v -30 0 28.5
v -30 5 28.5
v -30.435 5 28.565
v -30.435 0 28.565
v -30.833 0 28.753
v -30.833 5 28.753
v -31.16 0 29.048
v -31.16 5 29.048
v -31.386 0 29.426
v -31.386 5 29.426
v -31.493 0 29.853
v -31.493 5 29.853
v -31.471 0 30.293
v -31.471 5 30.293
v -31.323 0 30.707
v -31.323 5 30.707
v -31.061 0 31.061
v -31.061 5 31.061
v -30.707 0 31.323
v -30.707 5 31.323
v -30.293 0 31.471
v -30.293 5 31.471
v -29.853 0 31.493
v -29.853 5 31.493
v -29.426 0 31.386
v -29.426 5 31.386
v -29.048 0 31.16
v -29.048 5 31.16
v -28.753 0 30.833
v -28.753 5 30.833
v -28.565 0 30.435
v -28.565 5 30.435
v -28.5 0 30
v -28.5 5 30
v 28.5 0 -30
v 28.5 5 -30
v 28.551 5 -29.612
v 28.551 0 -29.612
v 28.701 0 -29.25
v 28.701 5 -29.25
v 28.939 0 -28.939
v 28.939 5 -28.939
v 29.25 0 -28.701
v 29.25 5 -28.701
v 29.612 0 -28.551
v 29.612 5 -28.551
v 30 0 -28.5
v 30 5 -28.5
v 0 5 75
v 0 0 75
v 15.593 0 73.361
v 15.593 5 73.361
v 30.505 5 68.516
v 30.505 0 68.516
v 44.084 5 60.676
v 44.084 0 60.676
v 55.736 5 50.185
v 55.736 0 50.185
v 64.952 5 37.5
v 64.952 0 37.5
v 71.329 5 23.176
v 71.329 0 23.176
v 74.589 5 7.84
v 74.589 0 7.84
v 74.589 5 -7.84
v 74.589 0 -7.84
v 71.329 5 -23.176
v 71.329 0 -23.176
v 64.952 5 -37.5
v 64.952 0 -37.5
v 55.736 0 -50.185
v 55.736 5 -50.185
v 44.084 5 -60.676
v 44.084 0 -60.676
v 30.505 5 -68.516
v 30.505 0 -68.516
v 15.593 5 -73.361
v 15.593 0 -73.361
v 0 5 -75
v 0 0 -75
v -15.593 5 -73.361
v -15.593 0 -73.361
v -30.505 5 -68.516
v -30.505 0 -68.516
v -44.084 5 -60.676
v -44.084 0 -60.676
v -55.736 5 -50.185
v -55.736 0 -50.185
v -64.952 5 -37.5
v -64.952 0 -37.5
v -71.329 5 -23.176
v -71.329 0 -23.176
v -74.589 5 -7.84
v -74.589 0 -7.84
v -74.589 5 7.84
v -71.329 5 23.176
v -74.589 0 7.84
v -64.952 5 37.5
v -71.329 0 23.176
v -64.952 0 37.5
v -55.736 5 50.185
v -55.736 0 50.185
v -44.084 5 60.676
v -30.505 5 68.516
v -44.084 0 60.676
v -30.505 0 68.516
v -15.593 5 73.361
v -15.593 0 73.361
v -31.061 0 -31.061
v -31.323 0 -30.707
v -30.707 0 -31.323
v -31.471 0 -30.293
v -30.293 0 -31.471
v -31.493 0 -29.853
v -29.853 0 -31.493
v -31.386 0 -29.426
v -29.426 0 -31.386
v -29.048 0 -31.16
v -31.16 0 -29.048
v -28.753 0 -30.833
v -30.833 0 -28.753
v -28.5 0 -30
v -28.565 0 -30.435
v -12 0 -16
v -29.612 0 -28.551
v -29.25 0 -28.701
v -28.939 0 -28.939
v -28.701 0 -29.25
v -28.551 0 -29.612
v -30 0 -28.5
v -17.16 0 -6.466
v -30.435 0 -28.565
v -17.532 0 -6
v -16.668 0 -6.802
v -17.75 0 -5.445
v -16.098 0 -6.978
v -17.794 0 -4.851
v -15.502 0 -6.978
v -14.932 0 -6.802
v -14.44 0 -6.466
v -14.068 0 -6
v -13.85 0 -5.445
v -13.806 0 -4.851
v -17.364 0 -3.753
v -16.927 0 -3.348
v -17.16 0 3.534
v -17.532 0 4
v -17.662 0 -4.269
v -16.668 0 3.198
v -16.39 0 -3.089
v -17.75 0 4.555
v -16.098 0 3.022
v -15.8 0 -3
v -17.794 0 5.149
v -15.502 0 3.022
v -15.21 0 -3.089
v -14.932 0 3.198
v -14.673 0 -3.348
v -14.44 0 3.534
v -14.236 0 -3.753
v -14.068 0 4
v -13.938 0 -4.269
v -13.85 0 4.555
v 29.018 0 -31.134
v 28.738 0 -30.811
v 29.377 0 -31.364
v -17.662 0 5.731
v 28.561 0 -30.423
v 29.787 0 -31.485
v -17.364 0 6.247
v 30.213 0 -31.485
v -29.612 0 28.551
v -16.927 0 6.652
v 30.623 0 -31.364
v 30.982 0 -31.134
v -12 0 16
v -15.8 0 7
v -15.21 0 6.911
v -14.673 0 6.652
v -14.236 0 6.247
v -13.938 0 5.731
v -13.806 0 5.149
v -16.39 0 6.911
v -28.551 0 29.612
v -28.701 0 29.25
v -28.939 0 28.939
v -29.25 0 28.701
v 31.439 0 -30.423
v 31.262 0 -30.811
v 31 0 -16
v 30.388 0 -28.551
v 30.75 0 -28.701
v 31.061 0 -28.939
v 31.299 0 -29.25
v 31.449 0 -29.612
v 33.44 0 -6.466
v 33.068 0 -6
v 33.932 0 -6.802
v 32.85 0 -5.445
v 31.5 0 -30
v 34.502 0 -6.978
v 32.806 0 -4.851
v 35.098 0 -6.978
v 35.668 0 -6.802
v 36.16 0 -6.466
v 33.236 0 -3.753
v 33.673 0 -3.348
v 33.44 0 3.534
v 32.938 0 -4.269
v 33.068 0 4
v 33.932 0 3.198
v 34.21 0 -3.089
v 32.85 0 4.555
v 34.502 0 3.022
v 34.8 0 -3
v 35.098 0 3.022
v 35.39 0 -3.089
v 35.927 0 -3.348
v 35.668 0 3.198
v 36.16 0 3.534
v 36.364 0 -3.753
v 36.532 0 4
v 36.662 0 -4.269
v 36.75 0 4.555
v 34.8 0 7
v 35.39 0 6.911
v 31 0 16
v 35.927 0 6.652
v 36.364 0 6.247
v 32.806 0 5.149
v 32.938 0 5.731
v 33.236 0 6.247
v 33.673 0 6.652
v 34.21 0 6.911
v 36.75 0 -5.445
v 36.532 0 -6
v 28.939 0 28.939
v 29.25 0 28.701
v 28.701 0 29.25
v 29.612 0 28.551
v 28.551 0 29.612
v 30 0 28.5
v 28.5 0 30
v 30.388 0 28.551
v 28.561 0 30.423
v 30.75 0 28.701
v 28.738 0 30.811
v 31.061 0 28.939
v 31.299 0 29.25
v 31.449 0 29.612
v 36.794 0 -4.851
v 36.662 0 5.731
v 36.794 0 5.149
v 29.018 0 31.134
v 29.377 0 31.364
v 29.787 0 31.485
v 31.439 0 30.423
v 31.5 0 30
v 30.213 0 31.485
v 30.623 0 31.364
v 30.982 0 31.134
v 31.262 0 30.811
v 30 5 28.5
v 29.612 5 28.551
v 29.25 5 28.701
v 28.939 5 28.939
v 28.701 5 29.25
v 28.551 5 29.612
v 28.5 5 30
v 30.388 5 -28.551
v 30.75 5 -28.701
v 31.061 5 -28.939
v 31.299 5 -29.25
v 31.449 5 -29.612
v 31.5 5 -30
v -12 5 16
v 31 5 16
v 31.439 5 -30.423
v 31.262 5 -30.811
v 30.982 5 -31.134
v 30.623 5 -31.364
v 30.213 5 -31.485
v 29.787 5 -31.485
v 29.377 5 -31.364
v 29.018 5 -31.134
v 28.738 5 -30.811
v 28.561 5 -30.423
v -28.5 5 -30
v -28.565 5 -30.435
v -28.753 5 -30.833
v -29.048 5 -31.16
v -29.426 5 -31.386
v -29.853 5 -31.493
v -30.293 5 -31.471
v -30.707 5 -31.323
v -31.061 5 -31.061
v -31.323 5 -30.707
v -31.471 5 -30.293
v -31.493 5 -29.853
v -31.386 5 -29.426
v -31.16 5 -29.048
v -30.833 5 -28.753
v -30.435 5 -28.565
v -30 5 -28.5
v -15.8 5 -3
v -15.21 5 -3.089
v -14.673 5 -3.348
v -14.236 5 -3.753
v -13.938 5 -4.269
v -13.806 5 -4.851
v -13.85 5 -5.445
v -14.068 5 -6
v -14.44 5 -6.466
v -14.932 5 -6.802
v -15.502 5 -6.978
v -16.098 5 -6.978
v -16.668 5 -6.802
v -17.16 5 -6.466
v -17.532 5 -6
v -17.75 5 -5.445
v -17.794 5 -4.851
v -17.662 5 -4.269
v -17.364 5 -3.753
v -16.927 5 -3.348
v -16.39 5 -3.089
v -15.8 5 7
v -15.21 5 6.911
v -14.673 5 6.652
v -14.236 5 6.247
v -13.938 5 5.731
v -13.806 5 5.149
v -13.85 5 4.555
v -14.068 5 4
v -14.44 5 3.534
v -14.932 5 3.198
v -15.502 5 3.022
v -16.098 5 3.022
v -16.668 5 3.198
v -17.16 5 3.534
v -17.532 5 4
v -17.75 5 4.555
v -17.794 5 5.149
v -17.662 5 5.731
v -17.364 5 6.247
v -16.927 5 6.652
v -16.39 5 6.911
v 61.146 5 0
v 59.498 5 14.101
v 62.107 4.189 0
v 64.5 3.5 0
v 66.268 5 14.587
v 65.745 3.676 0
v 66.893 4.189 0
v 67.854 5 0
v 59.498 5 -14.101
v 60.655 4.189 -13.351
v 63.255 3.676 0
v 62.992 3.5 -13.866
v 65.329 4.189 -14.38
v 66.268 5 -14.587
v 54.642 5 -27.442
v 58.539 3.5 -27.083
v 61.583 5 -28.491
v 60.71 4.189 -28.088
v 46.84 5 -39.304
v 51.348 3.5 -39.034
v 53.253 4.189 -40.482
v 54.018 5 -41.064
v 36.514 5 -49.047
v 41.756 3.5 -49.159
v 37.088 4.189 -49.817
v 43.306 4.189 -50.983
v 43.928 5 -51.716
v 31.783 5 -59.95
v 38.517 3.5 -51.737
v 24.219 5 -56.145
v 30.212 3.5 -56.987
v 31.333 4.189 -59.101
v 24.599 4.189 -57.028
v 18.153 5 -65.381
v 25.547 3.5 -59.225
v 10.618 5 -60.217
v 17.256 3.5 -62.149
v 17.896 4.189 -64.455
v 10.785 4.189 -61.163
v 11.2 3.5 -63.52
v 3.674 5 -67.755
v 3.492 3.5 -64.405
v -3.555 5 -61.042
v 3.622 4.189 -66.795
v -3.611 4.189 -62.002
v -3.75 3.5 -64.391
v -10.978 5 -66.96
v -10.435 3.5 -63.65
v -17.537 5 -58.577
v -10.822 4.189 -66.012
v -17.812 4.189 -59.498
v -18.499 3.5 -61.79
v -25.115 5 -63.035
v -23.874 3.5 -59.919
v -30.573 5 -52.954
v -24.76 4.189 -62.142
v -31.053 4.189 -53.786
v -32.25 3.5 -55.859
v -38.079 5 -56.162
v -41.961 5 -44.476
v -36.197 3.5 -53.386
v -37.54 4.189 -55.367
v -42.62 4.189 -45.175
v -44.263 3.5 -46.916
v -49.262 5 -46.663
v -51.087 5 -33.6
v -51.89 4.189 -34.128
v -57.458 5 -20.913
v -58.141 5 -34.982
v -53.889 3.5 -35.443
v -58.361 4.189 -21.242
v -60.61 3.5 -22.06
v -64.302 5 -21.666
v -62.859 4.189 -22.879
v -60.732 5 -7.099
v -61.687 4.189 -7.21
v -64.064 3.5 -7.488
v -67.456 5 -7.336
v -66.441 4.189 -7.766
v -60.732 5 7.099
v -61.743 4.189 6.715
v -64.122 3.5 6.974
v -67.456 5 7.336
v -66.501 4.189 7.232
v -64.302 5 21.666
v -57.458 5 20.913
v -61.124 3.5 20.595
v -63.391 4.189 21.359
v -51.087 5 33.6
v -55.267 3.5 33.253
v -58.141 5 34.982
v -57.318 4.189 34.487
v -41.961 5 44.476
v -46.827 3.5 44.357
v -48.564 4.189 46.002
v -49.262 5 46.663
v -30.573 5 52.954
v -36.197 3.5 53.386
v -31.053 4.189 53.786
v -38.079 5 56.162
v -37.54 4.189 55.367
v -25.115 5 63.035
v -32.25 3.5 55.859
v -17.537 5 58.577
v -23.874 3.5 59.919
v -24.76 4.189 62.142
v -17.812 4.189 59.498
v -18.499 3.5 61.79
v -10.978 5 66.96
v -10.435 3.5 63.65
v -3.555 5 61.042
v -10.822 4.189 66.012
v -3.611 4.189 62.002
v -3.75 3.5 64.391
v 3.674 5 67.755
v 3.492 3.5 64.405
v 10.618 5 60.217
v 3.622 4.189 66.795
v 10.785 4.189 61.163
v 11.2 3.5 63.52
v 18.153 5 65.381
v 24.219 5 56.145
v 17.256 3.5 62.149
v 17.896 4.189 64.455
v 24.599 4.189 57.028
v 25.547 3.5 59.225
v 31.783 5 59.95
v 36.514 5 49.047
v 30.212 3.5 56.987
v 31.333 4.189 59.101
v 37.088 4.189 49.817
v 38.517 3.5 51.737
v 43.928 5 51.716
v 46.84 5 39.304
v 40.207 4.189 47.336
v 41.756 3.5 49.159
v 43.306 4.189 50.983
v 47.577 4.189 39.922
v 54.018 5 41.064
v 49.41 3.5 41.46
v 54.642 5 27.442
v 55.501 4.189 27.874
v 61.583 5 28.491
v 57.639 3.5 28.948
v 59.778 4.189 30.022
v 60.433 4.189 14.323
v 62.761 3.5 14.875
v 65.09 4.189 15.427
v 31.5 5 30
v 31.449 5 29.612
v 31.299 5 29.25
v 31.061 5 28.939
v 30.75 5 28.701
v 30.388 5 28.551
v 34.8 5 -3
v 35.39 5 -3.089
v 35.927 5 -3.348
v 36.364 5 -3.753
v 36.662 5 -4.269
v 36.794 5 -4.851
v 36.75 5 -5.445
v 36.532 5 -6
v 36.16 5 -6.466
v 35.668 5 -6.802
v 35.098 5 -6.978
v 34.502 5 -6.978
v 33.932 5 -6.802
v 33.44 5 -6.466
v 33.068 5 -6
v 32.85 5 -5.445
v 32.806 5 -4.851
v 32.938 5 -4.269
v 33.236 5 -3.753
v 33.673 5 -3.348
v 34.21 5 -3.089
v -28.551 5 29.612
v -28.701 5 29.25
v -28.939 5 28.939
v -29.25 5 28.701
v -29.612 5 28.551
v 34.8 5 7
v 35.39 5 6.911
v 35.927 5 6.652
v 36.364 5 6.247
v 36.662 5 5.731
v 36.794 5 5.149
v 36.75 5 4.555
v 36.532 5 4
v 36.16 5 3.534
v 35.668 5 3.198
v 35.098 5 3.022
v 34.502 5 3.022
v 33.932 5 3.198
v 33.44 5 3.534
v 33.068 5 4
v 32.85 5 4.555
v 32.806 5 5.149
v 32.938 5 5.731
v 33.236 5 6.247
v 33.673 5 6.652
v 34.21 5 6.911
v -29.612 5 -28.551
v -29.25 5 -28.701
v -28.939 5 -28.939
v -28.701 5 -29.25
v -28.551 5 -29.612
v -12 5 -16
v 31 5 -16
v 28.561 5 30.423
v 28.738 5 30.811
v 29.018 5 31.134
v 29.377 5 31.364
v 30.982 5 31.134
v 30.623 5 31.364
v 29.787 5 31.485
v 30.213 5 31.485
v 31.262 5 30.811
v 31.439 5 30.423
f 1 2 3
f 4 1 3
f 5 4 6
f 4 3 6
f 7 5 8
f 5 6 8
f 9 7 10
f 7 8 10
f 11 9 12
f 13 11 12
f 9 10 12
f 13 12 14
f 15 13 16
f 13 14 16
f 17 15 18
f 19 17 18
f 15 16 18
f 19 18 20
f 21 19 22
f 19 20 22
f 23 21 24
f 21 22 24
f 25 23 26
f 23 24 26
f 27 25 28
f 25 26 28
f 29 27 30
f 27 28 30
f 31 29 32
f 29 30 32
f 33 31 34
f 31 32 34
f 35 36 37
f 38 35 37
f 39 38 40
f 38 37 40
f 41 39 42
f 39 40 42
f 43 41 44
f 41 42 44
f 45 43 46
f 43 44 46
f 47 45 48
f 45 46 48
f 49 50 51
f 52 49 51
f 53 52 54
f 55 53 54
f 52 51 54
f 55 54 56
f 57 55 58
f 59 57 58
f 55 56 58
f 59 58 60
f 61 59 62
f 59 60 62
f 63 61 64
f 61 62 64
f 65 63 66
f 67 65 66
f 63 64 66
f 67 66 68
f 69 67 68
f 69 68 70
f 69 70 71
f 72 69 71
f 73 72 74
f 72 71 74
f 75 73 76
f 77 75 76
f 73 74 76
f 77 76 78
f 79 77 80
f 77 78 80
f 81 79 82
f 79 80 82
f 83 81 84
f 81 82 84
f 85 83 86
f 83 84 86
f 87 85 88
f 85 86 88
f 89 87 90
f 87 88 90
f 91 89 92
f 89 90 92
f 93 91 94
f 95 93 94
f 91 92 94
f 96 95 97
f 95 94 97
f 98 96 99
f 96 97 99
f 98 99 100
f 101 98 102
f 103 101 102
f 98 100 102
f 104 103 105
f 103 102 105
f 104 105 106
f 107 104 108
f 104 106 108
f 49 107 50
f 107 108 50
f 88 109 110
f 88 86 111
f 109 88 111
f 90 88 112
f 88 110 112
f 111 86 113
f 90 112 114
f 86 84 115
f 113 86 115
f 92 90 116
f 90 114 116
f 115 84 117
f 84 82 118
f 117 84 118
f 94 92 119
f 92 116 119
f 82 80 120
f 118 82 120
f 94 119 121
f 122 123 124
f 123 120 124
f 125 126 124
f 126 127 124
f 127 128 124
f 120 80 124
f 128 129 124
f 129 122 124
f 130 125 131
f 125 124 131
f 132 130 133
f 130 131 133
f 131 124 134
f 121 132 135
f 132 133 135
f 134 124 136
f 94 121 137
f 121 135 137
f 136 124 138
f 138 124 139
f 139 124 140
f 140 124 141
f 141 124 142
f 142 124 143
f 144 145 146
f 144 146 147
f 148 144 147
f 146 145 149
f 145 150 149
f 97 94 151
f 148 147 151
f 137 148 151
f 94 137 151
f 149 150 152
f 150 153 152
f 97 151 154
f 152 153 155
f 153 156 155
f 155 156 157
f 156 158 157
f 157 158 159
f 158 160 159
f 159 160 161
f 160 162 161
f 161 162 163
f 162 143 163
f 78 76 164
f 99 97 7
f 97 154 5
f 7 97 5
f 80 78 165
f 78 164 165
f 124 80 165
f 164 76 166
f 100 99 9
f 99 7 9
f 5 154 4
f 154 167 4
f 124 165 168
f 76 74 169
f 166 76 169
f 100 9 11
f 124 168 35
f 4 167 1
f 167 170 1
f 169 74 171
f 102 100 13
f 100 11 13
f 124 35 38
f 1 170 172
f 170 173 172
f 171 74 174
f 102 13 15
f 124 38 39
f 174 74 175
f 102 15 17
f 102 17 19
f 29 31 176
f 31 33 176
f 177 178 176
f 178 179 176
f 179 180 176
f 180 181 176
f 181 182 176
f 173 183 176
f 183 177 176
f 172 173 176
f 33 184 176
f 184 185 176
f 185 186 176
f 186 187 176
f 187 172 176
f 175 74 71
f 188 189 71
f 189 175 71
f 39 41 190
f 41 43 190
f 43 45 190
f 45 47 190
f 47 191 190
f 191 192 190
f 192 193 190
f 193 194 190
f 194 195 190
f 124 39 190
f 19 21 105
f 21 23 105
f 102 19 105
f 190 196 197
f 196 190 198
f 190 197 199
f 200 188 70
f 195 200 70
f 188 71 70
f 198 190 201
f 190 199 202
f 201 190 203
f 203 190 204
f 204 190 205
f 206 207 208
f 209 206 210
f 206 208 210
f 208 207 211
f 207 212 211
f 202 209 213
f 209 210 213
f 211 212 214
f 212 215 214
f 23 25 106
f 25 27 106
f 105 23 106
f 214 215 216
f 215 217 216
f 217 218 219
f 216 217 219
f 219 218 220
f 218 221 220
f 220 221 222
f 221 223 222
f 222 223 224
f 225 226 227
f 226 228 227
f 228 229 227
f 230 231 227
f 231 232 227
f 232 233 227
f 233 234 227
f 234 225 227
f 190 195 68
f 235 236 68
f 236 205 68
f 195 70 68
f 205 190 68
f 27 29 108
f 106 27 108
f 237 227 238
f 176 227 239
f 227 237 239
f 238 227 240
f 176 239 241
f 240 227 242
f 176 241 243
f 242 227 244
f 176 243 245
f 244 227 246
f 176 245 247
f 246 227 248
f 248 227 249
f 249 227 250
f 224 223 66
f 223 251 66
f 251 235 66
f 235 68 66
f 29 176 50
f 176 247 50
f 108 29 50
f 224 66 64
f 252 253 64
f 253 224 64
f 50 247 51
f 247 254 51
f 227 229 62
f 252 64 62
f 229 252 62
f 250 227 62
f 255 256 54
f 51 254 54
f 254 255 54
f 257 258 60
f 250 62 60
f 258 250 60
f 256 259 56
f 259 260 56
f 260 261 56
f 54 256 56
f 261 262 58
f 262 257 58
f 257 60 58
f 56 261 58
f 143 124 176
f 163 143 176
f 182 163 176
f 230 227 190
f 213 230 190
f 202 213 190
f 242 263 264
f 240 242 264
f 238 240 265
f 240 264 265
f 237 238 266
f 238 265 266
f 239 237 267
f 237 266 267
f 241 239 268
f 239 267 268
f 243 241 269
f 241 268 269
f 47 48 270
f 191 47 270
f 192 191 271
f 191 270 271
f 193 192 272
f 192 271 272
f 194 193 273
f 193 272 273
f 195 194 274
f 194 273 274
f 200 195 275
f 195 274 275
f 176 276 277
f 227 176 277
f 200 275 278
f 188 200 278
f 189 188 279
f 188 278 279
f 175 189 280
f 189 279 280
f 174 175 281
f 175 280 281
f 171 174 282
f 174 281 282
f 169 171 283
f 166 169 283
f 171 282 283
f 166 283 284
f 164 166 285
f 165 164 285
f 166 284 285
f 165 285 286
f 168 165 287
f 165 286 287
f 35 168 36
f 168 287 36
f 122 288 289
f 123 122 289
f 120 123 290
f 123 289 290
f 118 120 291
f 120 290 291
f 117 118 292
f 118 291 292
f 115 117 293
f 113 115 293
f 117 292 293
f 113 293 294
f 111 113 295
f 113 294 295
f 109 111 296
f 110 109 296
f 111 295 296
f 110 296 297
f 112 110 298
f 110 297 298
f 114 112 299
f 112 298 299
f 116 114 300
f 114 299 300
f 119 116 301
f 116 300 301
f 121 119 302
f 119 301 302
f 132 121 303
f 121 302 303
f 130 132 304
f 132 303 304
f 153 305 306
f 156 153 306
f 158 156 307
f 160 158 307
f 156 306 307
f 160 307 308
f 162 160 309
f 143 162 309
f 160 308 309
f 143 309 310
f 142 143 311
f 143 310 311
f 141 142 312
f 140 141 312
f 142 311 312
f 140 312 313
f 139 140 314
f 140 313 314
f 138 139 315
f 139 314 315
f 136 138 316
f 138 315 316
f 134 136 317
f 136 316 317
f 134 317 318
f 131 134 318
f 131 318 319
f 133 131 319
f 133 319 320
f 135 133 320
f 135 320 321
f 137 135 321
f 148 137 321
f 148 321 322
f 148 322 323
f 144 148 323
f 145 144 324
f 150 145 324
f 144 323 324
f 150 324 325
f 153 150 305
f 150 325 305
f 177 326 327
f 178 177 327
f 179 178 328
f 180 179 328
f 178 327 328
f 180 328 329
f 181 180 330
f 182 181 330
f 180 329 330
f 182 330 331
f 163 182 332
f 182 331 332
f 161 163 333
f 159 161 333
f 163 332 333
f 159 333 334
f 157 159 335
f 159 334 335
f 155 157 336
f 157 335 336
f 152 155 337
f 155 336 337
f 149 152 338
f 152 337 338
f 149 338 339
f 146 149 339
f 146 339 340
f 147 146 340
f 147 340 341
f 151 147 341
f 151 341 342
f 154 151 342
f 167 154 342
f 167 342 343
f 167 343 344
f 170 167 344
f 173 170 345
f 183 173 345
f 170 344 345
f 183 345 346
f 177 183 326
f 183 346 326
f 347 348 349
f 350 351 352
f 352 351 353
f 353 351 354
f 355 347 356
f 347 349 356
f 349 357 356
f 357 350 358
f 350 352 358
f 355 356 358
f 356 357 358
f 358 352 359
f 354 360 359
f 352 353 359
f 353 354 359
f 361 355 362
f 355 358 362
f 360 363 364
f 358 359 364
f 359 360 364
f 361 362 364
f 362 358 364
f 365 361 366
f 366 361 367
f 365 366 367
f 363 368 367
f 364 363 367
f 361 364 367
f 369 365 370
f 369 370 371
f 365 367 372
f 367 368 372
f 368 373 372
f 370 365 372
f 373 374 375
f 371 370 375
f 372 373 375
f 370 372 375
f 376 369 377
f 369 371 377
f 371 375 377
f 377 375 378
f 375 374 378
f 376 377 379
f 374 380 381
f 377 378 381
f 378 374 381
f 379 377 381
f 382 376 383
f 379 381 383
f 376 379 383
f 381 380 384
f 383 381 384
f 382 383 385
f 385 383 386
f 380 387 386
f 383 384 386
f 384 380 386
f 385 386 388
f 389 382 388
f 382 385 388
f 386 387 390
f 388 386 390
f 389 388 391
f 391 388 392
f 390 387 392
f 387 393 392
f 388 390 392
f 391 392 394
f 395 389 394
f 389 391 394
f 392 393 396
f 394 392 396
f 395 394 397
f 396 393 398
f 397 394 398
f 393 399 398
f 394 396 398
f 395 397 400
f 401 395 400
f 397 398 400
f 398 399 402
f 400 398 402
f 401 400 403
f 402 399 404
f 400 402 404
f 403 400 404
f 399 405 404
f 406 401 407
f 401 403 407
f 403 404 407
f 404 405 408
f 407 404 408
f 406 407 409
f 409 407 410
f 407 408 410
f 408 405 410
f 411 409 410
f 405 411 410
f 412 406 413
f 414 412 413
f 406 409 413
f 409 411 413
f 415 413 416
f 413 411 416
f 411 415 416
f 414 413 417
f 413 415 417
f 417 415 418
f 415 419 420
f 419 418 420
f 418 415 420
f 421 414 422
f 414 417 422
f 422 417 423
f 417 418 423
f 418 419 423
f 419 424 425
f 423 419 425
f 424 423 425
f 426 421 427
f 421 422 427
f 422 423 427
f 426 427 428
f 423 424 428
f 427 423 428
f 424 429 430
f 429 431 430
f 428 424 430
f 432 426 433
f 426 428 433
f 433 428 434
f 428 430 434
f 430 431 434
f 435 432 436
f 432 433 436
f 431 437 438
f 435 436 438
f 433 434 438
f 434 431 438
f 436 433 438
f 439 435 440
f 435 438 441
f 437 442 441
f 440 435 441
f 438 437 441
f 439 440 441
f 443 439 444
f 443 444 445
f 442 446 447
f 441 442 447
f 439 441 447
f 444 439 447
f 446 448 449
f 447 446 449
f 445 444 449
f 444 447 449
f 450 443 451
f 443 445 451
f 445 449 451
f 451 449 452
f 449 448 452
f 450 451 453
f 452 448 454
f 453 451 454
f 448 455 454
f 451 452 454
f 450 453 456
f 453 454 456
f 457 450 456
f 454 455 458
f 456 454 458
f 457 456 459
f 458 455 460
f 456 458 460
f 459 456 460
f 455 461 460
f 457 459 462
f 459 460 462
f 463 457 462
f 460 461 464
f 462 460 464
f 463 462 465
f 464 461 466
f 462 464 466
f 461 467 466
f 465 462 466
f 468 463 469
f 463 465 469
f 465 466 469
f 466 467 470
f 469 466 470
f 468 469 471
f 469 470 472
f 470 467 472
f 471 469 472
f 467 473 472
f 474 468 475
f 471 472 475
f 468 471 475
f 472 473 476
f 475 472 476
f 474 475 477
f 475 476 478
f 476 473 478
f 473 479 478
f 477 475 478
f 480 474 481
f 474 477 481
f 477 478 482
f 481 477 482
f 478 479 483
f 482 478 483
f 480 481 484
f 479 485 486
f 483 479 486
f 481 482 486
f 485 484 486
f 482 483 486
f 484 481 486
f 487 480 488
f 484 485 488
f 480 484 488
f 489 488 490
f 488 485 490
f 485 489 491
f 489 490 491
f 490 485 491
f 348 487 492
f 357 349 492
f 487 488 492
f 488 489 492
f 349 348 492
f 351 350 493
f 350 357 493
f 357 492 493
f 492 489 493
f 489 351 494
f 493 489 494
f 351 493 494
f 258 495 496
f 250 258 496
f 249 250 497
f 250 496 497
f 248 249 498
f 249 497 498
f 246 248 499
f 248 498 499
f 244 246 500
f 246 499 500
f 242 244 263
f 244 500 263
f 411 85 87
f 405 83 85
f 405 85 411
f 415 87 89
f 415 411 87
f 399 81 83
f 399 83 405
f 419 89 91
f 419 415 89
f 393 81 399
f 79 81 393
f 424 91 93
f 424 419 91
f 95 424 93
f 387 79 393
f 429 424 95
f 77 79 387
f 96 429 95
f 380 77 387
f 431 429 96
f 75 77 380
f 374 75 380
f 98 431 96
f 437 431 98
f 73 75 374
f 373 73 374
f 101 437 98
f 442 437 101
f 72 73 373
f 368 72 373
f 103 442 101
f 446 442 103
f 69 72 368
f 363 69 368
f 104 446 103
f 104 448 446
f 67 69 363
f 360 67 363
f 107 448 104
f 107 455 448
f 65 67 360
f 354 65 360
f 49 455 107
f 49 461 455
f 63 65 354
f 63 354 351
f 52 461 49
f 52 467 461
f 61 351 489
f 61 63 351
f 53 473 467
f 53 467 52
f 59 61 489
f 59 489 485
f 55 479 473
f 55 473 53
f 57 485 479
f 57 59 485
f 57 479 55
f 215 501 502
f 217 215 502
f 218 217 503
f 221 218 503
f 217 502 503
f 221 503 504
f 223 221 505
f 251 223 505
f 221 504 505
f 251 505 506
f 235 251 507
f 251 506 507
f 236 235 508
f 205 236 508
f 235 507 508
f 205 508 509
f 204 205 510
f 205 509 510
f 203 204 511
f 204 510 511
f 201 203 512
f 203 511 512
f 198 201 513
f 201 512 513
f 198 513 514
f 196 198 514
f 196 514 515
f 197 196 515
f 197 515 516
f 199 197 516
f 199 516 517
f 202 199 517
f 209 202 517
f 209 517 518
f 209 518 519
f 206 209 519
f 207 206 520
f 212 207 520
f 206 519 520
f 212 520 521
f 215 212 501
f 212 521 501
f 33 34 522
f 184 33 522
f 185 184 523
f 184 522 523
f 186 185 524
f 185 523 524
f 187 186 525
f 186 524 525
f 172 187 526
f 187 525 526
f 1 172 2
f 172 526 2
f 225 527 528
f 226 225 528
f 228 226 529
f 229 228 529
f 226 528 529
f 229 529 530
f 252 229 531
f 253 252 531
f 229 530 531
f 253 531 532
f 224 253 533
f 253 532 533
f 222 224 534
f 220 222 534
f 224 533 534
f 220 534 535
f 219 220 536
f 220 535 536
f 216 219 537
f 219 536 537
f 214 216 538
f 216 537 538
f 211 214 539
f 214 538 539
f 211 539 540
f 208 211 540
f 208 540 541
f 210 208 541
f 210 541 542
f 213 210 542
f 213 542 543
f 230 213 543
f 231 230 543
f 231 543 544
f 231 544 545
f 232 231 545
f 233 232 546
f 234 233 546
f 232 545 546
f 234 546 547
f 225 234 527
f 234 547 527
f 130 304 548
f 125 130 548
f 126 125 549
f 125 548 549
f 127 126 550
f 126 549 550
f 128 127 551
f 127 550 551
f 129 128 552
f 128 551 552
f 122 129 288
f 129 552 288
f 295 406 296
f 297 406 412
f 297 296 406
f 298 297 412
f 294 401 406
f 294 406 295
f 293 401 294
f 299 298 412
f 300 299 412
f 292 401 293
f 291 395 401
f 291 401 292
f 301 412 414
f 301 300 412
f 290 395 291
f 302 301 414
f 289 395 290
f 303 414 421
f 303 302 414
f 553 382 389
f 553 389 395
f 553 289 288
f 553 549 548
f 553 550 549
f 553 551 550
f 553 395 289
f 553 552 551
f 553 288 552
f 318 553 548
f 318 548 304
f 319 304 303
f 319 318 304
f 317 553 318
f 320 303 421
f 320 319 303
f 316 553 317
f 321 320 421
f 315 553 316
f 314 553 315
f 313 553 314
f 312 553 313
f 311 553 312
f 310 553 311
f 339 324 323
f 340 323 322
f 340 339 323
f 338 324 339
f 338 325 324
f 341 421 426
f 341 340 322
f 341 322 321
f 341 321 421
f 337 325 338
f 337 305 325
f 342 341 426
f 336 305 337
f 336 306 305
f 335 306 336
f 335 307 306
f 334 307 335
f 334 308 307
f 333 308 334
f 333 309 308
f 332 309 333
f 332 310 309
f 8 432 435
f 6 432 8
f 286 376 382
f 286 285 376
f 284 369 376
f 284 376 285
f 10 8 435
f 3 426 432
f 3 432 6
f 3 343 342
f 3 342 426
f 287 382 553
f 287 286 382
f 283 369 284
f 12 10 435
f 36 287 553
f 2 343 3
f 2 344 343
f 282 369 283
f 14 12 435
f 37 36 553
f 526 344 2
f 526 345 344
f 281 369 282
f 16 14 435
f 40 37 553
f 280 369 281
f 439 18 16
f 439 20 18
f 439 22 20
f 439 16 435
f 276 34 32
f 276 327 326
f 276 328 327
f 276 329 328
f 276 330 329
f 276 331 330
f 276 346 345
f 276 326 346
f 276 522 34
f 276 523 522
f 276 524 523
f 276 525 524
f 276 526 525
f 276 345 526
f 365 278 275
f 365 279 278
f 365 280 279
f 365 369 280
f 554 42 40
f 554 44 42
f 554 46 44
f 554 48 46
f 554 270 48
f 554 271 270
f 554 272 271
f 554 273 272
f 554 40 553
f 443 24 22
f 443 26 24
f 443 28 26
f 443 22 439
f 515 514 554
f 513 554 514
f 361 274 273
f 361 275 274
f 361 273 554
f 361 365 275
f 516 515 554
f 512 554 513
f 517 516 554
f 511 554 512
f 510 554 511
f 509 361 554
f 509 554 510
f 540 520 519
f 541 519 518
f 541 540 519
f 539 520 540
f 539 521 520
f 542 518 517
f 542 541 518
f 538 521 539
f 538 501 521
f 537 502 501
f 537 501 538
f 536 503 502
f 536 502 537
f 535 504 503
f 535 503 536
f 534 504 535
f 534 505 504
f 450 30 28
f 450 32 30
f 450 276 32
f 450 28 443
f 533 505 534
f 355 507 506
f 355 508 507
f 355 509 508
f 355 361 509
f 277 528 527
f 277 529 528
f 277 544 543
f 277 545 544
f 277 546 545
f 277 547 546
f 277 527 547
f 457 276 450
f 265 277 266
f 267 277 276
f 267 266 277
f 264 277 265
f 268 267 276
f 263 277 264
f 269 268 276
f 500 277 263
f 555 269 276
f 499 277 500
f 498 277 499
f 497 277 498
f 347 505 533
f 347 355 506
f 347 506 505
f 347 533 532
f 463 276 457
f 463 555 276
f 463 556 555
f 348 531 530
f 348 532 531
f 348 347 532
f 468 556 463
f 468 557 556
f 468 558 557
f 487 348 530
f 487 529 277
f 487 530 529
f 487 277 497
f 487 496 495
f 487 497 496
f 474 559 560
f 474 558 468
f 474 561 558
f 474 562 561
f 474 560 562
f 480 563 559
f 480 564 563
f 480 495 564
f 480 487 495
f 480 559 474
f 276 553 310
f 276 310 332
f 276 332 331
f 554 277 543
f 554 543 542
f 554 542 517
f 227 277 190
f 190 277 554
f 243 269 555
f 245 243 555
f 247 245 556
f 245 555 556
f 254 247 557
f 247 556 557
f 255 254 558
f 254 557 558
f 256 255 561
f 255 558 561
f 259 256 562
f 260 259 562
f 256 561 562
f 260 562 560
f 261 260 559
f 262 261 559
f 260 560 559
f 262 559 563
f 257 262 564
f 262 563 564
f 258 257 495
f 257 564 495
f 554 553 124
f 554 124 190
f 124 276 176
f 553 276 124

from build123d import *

# Parameters (mm, degrees)
CROQUIS1_R              = 75
SALIENTE_EXTRUIR1_DEPTH = 5
CORTAR_EXTRUIR1_DEPTH   = 5
CORTAR_EXTRUIR2_DEPTH   = 5
CROQUIS6_R              = 4.5
CROQUIS11_W             = 43
CROQUIS11_H             = 3
CORTAR_EXTRUIR3_DEPTH   = 5
CROQUIS12_R             = 2
CORTAR_EXTRUIR4_DEPTH   = 5


with BuildPart() as part:
    # Croquis1 → Saliente-Extruir1 (new body)
    with BuildSketch(Plane(origin=(0, 0, 0), x_dir=(1, 0, 0), z_dir=(0, 1, 0))):
        with Locations(Location((0, 0, 0), (0, 0, 270))):
            Circle(CROQUIS1_R)
    extrude(amount=SALIENTE_EXTRUIR1_DEPTH)

    # Croquis2 → Cortar-Extruir1 (cut)
    with BuildSketch(Plane(origin=(0, 5, 0), x_dir=(1, 0, 0), z_dir=(0, 1, 0))):
        Polygon((31, 0), (0, 0), (-12, 0), (-12, -13), (31, -13), align=None)
        Polygon((-12, 0), (0, 0), (31, 0), (31, 13), (-12, 13), align=None)
    extrude(amount=-CORTAR_EXTRUIR1_DEPTH, mode=Mode.SUBTRACT)

    # Croquis4 → Cortar-Extruir2 (cut)
    with BuildSketch(Plane(origin=(0, 5, 0), x_dir=(1, 0, 0), z_dir=(0, 1, 0))):
        with BuildLine():
            ThreePointArc((-28.5, 30), (-31.060660172, 31.060660172), (-30, 28.5))
            Line((-30, 28.5), (-30, 30))
            Line((-30, 30), (-28.5, 30))
        make_face()
        with BuildLine():
            Line((-30, 30), (-30, 28.5))
            ThreePointArc((-30, 28.5), (-28.939339828, 28.939339828), (-28.5, 30))
            Line((-28.5, 30), (-30, 30))
        make_face()
        with BuildLine():
            ThreePointArc((28.5, 30), (28.939339828, 28.939339828), (30, 28.5))
            Line((30, 28.5), (30, 30))
            Line((30, 30), (28.5, 30))
        make_face()
        with BuildLine():
            Line((30, 30), (30, 28.5))
            ThreePointArc((30, 28.5), (31.060660172, 28.939339828), (31.5, 30))
            ThreePointArc((31.5, 30), (30, 31.5), (28.5, 30))
            Line((28.5, 30), (30, 30))
        make_face()
        with BuildLine():
            ThreePointArc((30, -28.5), (28.939339828, -28.939339828), (28.5, -30))
            Line((28.5, -30), (30, -30))
            Line((30, -30), (30, -28.5))
        make_face()
        with BuildLine():
            Line((30, -30), (28.5, -30))
            ThreePointArc((28.5, -30), (30, -31.5), (31.5, -30))
            ThreePointArc((31.5, -30), (31.060660172, -28.939339828), (30, -28.5))
            Line((30, -28.5), (30, -30))
        make_face()
        with BuildLine():
            Line((-30, -28.5), (-30, -30))
            Line((-30, -30), (-28.5, -30))
            ThreePointArc((-28.5, -30), (-28.939339828, -28.939339828), (-30, -28.5))
        make_face()
        with BuildLine():
            Line((-28.5, -30), (-30, -30))
            Line((-30, -30), (-30, -28.5))
            ThreePointArc((-30, -28.5), (-31.060660172, -31.060660172), (-28.5, -30))
        make_face()
    extrude(amount=-CORTAR_EXTRUIR2_DEPTH, mode=Mode.SUBTRACT)

    # Cortar-Barrer3: sweep along a path in Croquis5
    with BuildLine(Plane(origin=(0, 5, 0), x_dir=(1, 0, 0), z_dir=(0, 1, 0))) as cortar_barrer3_path:
        CenterArc((0, 0), 64.5, 0, 360)
    # Croquis6 → Cortar-Barrer3 (sweep, cut)
    with BuildSketch(Plane.XY):
        with Locations((64.5, 8)):
            Circle(CROQUIS6_R)
    sweep(path=cortar_barrer3_path.line, mode=Mode.SUBTRACT)

    # Croquis11 → Cortar-Extruir3 (cut)
    with BuildSketch(Plane(origin=(0, 5, 0), x_dir=(1, 0, 0), z_dir=(0, 1, 0))):
        with Locations((9.5, 14.5)):
            Rectangle(CROQUIS11_W, CROQUIS11_H)
        with Locations((9.5, -14.5)):
            Rectangle(CROQUIS11_W, CROQUIS11_H)
    extrude(amount=-CORTAR_EXTRUIR3_DEPTH, mode=Mode.SUBTRACT)

    # Croquis12 → Cortar-Extruir4 (cut)
    with BuildSketch(Plane(origin=(0, 5, 0), x_dir=(1, 0, 0), z_dir=(0, 1, 0))):
        with Locations(Location((34.8, 5, 0), (0, 0, 270))):
            Circle(CROQUIS12_R)
        with Locations(Location((34.8, -5, 0), (0, 0, 270))):
            Circle(CROQUIS12_R)
        with Locations(Location((-15.8, -5, 0), (0, 0, 270))):
            Circle(CROQUIS12_R)
        with Locations(Location((-15.8, 5, 0), (0, 0, 270))):
            Circle(CROQUIS12_R)
    extrude(amount=-CORTAR_EXTRUIR4_DEPTH, mode=Mode.SUBTRACT)


solid = part.part
